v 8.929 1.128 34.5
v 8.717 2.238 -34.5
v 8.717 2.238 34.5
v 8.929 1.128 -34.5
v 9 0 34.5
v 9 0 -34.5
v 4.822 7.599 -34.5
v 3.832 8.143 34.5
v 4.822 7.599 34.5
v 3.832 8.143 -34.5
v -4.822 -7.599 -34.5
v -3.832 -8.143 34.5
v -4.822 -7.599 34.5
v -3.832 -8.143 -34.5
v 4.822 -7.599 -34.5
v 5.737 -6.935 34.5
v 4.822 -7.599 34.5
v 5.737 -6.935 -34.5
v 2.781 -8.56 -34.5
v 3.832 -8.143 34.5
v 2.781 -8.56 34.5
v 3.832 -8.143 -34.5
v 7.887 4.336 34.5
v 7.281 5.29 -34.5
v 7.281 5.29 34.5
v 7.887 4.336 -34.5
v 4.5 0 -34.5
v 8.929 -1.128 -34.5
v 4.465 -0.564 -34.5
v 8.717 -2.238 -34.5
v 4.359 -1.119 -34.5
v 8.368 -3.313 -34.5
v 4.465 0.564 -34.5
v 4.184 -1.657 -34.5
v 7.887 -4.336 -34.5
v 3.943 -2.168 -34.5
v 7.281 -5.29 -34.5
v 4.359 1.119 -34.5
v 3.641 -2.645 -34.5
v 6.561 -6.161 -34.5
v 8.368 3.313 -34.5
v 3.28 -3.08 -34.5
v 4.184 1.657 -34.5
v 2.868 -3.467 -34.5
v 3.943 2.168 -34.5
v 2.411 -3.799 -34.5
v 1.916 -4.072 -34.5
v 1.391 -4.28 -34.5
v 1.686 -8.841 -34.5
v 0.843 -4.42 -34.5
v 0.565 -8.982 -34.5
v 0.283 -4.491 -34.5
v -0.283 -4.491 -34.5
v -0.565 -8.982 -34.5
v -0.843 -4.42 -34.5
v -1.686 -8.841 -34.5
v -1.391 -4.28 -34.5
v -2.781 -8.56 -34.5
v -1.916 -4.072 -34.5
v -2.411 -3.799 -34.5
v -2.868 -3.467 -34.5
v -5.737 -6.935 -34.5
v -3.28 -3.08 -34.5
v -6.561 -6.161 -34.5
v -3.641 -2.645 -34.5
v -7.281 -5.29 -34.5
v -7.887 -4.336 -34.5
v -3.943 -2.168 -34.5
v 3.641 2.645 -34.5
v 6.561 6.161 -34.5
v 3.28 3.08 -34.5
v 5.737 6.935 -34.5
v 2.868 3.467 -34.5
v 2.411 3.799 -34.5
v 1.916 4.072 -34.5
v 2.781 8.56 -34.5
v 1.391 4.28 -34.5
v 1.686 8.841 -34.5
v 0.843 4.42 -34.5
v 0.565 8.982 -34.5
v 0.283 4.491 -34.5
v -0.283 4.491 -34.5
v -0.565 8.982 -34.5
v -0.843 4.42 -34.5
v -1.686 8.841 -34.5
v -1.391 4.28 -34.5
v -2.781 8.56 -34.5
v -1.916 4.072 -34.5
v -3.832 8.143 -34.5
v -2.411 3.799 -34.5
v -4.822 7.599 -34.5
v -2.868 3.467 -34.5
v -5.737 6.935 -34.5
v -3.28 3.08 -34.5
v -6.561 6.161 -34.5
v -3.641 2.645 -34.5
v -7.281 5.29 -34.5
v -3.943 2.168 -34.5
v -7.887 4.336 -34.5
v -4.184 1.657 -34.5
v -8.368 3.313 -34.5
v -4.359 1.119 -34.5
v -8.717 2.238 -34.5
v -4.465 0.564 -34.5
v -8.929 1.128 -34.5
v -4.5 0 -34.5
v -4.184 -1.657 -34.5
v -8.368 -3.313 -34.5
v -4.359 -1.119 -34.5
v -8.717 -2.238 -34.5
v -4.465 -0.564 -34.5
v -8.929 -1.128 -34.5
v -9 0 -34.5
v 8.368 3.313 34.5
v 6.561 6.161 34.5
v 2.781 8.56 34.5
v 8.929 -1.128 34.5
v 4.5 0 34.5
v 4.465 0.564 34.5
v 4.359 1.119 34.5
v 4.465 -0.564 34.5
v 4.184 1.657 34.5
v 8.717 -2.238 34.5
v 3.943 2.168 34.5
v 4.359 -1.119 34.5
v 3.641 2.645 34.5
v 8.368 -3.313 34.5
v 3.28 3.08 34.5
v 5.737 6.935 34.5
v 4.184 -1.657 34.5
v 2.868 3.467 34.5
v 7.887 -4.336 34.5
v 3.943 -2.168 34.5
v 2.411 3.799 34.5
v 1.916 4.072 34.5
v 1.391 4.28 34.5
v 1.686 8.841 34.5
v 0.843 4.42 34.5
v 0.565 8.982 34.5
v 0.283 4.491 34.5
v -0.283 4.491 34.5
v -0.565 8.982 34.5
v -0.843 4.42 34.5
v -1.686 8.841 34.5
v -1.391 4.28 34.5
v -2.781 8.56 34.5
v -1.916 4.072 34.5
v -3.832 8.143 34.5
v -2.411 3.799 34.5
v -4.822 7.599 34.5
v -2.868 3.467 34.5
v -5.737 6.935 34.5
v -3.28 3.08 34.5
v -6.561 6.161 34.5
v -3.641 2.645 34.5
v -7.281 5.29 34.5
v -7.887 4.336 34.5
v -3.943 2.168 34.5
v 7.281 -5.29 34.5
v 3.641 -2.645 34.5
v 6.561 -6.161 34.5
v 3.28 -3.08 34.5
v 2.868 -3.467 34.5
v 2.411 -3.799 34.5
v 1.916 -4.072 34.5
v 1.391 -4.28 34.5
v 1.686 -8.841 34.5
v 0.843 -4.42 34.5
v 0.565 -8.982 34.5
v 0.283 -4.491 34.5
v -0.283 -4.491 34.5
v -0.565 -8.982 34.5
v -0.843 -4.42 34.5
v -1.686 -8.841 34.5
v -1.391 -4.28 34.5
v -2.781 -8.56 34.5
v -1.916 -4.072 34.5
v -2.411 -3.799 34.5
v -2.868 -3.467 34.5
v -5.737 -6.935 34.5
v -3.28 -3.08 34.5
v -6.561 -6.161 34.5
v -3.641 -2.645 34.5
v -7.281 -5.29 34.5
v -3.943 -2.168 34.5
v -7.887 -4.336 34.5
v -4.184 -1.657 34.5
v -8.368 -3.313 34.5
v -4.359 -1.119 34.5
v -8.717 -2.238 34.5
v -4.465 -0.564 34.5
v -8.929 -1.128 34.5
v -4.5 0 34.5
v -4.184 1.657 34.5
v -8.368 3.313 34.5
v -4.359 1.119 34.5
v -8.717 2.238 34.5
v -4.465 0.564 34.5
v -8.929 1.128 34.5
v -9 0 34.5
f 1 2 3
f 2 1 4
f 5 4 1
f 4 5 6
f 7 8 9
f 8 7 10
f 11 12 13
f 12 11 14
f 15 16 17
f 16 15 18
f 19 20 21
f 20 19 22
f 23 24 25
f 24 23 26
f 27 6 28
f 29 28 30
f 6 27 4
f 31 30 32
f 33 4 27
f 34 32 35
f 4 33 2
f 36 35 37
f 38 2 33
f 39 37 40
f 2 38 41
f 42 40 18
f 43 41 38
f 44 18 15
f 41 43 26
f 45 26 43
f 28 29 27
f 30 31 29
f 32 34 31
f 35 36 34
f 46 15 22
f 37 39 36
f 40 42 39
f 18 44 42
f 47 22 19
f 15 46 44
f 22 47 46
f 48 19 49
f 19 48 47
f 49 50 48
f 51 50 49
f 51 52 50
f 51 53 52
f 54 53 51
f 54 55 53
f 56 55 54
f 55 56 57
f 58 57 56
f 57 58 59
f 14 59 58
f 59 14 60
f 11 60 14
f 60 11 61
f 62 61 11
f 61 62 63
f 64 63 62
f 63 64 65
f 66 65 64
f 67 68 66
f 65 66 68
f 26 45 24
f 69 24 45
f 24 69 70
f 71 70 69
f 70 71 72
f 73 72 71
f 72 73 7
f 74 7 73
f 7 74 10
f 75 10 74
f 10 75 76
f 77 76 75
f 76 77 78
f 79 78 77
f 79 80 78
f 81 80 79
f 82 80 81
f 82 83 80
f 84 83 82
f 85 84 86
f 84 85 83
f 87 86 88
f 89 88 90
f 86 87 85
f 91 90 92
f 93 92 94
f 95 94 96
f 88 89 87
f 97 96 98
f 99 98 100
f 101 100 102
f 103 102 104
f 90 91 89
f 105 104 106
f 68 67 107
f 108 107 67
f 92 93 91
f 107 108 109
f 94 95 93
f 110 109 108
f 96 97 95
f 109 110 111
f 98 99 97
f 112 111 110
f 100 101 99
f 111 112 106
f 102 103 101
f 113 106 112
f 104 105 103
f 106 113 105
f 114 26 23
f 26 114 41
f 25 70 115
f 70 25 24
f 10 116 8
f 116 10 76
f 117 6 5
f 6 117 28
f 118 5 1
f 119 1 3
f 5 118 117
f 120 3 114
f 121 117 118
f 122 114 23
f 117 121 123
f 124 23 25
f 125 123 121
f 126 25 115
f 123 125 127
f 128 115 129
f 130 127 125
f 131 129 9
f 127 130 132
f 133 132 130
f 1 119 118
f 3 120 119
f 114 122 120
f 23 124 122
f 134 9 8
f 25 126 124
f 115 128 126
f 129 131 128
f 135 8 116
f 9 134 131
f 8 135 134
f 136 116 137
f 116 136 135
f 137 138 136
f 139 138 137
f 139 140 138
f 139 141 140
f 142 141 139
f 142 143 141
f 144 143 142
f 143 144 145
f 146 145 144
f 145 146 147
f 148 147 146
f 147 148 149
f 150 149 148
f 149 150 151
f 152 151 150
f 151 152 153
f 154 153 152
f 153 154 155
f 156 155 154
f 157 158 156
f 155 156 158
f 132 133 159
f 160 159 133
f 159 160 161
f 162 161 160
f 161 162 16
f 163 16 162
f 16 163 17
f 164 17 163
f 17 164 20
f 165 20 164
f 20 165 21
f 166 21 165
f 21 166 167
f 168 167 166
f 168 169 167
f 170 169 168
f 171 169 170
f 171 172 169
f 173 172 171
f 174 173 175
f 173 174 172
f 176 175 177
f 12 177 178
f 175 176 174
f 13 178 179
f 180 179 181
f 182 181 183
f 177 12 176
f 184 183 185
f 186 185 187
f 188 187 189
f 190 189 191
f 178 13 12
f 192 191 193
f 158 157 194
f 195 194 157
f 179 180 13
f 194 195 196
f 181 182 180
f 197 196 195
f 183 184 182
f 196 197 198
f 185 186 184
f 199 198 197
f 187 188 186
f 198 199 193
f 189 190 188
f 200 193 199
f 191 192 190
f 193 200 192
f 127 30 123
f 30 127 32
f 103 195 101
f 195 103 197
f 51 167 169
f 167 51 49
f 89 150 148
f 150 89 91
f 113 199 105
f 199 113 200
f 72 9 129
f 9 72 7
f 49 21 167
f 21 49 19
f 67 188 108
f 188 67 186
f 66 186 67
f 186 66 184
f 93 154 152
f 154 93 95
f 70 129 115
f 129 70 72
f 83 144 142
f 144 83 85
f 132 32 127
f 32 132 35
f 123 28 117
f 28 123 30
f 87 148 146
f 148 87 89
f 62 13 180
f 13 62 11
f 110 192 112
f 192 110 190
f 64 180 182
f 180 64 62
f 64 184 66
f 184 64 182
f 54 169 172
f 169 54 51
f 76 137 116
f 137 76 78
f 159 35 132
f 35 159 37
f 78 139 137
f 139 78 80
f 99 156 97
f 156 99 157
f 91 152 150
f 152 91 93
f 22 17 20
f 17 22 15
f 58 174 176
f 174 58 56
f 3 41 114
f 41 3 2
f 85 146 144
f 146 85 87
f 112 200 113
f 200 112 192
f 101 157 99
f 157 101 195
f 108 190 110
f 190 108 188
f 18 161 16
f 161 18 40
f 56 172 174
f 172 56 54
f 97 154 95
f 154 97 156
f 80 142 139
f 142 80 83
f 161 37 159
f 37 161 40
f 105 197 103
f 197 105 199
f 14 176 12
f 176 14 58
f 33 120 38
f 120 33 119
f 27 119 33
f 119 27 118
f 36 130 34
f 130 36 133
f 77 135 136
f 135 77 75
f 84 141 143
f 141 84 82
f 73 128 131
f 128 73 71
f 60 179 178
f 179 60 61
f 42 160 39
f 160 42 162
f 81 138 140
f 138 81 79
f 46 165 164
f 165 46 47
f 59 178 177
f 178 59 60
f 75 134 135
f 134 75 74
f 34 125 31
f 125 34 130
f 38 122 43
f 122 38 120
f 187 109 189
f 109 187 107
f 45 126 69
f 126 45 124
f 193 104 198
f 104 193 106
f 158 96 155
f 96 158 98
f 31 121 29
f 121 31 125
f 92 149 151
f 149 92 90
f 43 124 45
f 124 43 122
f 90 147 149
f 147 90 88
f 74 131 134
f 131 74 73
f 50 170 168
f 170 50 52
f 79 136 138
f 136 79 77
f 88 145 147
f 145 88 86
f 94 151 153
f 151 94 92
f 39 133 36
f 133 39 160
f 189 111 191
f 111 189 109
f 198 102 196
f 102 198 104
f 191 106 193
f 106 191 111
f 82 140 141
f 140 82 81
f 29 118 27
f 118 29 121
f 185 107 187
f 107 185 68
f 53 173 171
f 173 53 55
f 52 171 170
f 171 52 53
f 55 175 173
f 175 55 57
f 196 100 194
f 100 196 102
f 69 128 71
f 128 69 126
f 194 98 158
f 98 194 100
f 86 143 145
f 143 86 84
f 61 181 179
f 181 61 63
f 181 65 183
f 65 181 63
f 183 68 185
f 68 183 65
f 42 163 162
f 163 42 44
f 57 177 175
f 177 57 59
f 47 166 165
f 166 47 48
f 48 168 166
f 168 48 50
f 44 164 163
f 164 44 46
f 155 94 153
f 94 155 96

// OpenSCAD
$fn = 50;


difference() {
	union() {
		translate(v = [0, 0, -34.5000000000]) {
			cylinder(h = 69, r = 9.0000000000);
		}
	}
	union() {
		translate(v = [0, 0, -100.0000000000]) {
			cylinder(h = 200, r = 4.5000000000);
		}
	}
}
